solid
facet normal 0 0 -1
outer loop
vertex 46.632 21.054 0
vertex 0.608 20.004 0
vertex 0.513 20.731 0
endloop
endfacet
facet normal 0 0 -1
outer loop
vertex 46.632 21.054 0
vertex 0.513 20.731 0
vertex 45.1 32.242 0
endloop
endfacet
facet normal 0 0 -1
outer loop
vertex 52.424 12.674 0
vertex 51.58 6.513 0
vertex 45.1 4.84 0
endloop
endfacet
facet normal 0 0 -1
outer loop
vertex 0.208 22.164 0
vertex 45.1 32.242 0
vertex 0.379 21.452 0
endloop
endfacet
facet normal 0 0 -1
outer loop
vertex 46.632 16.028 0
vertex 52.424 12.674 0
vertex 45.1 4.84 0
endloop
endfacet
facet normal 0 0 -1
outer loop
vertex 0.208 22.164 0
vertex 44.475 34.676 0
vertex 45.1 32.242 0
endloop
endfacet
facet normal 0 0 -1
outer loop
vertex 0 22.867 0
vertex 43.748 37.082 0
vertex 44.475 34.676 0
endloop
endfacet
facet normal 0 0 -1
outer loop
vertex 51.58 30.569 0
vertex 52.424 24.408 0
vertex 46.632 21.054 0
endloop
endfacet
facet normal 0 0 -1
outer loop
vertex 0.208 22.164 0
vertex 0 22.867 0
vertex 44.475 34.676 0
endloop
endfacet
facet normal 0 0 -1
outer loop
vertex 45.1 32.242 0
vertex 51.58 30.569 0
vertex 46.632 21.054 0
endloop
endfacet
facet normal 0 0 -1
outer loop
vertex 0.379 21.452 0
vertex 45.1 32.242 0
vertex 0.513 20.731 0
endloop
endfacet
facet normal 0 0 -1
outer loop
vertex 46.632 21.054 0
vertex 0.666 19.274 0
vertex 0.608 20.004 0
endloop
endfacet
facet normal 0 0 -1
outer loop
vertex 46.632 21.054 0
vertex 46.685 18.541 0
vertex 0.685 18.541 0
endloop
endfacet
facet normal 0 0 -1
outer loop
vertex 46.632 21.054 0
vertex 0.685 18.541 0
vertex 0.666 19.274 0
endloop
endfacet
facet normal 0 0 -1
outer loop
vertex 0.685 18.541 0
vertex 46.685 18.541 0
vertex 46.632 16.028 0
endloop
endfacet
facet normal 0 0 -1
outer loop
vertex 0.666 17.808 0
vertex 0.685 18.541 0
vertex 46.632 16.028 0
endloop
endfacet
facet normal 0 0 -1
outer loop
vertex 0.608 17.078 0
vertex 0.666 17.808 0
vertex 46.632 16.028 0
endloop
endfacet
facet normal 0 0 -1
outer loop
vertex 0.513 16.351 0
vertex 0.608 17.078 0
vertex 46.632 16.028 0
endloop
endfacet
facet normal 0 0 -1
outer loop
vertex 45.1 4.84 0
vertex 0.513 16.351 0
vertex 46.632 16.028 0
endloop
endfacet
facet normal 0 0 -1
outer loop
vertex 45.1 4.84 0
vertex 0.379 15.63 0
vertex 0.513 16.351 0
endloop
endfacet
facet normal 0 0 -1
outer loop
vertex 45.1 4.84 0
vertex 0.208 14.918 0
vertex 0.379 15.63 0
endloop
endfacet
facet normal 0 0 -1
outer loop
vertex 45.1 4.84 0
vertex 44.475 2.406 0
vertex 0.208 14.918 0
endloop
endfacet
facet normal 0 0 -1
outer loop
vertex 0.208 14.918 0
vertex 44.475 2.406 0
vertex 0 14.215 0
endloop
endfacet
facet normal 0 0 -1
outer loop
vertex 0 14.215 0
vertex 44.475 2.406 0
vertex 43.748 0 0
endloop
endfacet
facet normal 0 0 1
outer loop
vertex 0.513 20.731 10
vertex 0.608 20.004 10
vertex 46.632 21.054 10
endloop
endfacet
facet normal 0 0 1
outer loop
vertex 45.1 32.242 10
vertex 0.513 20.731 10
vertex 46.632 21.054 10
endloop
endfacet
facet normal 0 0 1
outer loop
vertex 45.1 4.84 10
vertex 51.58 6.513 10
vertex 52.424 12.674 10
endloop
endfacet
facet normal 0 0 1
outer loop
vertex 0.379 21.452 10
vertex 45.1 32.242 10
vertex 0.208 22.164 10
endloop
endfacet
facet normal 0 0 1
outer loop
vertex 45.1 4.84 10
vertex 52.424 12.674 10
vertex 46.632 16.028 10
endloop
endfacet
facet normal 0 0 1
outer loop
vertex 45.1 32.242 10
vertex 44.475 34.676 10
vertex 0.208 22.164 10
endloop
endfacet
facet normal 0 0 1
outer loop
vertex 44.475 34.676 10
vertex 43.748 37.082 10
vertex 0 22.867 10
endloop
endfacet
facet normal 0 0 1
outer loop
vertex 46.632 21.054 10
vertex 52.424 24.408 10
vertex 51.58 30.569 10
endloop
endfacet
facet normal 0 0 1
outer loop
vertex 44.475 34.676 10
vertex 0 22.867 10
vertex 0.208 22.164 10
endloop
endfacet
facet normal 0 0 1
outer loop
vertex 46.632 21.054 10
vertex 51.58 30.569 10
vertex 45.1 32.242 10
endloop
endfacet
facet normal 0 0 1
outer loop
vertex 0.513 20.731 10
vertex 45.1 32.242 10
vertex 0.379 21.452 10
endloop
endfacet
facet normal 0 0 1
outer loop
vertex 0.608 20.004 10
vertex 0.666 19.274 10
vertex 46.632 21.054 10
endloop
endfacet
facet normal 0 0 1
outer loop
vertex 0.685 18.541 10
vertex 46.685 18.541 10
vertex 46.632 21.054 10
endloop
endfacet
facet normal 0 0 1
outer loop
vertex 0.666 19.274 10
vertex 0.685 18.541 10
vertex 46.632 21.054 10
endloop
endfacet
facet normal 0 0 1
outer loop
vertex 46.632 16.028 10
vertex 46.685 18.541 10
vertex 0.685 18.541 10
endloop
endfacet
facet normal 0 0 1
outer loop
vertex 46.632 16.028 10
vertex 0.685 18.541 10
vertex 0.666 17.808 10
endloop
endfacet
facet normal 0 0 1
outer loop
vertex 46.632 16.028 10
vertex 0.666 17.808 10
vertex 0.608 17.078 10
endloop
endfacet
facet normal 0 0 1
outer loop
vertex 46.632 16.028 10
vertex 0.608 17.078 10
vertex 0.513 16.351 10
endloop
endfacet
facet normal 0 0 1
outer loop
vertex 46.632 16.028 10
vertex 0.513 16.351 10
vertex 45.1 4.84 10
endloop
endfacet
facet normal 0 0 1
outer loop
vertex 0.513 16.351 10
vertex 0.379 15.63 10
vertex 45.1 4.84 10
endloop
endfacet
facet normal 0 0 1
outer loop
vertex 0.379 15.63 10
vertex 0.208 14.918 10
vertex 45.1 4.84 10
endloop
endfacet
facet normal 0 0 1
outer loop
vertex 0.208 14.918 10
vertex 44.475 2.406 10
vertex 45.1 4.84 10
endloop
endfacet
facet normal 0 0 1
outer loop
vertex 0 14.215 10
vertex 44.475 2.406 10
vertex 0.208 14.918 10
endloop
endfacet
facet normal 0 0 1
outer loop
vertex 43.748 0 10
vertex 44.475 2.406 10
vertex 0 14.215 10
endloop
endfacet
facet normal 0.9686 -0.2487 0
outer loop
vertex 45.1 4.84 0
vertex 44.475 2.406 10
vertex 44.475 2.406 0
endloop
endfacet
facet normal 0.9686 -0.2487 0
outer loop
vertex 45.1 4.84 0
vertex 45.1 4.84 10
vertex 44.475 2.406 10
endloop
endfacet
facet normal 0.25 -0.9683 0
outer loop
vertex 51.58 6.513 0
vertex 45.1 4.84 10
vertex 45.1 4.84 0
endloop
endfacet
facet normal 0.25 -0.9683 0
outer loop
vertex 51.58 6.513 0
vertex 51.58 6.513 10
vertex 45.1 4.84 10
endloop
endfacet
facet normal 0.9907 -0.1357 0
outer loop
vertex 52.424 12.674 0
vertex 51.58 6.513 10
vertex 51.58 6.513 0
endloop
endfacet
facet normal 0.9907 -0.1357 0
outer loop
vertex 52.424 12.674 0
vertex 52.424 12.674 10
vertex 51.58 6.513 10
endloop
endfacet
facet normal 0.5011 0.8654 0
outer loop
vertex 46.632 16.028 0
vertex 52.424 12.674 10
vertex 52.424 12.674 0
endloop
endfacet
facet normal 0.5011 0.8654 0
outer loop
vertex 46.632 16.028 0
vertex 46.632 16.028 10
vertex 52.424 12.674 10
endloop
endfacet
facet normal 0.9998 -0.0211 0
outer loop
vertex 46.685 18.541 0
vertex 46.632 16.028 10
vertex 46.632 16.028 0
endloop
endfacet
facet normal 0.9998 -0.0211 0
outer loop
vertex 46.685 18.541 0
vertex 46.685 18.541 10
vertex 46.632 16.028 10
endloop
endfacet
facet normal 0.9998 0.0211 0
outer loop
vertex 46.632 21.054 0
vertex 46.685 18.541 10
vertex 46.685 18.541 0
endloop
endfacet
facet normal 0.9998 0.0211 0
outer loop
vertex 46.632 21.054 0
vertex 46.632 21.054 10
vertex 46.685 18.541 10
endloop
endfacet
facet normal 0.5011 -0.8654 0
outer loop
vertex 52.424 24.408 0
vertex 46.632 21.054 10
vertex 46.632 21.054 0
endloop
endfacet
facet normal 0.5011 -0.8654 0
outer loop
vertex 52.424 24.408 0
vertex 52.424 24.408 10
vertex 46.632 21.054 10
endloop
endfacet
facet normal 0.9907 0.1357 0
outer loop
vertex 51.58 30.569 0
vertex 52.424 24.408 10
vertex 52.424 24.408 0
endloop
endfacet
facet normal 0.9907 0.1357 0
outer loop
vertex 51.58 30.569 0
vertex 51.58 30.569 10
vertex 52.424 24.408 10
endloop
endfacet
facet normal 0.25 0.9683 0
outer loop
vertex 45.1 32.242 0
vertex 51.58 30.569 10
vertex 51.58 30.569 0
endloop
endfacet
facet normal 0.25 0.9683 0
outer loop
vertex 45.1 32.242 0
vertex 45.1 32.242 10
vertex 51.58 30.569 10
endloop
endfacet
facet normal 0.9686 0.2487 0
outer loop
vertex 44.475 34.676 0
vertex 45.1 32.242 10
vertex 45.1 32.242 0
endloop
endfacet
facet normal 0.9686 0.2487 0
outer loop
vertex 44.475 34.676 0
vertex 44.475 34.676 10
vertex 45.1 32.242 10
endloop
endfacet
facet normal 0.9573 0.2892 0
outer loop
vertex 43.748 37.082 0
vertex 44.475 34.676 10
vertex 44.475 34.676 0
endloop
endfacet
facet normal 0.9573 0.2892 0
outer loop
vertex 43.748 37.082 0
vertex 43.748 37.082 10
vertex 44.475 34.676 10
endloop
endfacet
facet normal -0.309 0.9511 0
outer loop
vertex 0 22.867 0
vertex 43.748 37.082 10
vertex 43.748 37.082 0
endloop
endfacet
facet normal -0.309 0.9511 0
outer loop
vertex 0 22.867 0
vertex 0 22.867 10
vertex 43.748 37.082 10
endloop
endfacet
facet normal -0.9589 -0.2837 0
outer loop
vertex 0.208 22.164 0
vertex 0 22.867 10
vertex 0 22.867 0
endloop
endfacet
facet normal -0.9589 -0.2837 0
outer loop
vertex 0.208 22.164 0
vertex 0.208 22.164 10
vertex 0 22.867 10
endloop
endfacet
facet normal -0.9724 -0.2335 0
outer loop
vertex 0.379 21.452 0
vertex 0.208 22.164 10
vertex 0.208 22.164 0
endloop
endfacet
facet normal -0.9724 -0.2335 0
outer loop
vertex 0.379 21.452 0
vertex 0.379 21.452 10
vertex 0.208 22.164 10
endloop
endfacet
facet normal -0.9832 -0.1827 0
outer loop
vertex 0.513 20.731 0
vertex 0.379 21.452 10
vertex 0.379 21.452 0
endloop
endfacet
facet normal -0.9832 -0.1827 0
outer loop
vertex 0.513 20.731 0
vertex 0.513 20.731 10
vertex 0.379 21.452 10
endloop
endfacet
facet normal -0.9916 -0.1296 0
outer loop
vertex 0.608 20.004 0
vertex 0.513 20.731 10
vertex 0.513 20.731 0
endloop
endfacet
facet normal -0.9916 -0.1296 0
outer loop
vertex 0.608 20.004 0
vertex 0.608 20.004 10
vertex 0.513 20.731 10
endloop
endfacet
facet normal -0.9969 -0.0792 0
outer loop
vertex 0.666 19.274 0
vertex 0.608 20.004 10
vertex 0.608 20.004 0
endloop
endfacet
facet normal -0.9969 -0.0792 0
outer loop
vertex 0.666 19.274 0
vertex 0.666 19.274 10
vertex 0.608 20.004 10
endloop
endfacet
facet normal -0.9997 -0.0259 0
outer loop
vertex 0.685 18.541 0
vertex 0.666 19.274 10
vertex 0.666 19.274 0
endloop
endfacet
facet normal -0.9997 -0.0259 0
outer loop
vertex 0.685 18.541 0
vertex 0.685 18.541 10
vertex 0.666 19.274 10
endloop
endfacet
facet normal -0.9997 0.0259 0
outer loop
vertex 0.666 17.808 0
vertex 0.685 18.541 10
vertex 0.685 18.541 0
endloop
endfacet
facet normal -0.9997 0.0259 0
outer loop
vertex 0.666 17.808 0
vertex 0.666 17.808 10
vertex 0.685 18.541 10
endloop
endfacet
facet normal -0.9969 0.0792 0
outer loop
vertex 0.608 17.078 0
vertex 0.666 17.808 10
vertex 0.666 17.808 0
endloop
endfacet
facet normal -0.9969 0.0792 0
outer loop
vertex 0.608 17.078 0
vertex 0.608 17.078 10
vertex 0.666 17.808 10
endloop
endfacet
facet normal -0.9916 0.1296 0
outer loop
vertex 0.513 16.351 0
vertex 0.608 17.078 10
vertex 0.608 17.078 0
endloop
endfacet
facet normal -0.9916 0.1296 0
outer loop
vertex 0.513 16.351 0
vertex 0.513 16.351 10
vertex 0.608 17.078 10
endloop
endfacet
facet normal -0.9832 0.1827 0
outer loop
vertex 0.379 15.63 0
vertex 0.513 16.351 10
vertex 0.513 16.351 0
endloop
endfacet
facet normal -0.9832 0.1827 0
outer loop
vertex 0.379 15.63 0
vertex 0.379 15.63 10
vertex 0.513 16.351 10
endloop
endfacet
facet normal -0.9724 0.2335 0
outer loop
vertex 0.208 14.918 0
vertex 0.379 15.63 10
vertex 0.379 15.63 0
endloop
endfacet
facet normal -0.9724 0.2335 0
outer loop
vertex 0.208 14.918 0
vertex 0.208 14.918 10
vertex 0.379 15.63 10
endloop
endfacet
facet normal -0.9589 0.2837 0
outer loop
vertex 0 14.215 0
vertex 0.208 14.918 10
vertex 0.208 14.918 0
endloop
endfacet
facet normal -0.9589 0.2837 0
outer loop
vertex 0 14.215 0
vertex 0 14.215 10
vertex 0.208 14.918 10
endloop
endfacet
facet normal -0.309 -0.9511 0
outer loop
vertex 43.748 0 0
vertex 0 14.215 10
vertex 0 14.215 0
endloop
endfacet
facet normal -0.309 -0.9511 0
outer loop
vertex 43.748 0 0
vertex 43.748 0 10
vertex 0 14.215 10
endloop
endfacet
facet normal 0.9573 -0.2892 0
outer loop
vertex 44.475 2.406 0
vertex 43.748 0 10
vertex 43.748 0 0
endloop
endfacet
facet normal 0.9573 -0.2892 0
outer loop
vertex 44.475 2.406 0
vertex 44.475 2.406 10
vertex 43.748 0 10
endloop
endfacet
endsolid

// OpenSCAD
$fn = 32;

// ----------------------------------------------------------------------
// Gear sector: 2 teeth on 36 degrees
// ----------------------------------------------------------------------

// --- parameters (mm) ---
sector_angle = 36;        // sector angle, degrees
root_r = 60;              // root circle radius
tooth_h = 6;              // tooth height over the root circle
teeth = 2;                // number of teeth on the sector
hub_r = 14;               // hub bore radius
plate_t = 10;             // sector thickness, Z
arc_step = 3;             // sampling step of the root/hub arcs, degrees

tip_r = root_r + tooth_h;  // tip circle radius

profile = [[43.748, 0], [44.475, 2.406], [45.1, 4.84], [51.58, 6.513], [52.424, 12.674], [46.632, 16.028], [46.685, 18.541], [46.632, 21.054], [52.424, 24.408], [51.58, 30.569], [45.1, 32.242], [44.475, 34.676], [43.748, 37.082], [0, 22.867], [0.208, 22.164], [0.379, 21.452], [0.513, 20.731], [0.608, 20.004], [0.666, 19.274], [0.685, 18.541], [0.666, 17.808], [0.608, 17.078], [0.513, 16.351], [0.379, 15.63], [0.208, 14.918], [0, 14.215]];  // primary outline, 26 points, counter clockwise

// --- the one profile operation ---
linear_extrude(height = plate_t) polygon(points = profile);
